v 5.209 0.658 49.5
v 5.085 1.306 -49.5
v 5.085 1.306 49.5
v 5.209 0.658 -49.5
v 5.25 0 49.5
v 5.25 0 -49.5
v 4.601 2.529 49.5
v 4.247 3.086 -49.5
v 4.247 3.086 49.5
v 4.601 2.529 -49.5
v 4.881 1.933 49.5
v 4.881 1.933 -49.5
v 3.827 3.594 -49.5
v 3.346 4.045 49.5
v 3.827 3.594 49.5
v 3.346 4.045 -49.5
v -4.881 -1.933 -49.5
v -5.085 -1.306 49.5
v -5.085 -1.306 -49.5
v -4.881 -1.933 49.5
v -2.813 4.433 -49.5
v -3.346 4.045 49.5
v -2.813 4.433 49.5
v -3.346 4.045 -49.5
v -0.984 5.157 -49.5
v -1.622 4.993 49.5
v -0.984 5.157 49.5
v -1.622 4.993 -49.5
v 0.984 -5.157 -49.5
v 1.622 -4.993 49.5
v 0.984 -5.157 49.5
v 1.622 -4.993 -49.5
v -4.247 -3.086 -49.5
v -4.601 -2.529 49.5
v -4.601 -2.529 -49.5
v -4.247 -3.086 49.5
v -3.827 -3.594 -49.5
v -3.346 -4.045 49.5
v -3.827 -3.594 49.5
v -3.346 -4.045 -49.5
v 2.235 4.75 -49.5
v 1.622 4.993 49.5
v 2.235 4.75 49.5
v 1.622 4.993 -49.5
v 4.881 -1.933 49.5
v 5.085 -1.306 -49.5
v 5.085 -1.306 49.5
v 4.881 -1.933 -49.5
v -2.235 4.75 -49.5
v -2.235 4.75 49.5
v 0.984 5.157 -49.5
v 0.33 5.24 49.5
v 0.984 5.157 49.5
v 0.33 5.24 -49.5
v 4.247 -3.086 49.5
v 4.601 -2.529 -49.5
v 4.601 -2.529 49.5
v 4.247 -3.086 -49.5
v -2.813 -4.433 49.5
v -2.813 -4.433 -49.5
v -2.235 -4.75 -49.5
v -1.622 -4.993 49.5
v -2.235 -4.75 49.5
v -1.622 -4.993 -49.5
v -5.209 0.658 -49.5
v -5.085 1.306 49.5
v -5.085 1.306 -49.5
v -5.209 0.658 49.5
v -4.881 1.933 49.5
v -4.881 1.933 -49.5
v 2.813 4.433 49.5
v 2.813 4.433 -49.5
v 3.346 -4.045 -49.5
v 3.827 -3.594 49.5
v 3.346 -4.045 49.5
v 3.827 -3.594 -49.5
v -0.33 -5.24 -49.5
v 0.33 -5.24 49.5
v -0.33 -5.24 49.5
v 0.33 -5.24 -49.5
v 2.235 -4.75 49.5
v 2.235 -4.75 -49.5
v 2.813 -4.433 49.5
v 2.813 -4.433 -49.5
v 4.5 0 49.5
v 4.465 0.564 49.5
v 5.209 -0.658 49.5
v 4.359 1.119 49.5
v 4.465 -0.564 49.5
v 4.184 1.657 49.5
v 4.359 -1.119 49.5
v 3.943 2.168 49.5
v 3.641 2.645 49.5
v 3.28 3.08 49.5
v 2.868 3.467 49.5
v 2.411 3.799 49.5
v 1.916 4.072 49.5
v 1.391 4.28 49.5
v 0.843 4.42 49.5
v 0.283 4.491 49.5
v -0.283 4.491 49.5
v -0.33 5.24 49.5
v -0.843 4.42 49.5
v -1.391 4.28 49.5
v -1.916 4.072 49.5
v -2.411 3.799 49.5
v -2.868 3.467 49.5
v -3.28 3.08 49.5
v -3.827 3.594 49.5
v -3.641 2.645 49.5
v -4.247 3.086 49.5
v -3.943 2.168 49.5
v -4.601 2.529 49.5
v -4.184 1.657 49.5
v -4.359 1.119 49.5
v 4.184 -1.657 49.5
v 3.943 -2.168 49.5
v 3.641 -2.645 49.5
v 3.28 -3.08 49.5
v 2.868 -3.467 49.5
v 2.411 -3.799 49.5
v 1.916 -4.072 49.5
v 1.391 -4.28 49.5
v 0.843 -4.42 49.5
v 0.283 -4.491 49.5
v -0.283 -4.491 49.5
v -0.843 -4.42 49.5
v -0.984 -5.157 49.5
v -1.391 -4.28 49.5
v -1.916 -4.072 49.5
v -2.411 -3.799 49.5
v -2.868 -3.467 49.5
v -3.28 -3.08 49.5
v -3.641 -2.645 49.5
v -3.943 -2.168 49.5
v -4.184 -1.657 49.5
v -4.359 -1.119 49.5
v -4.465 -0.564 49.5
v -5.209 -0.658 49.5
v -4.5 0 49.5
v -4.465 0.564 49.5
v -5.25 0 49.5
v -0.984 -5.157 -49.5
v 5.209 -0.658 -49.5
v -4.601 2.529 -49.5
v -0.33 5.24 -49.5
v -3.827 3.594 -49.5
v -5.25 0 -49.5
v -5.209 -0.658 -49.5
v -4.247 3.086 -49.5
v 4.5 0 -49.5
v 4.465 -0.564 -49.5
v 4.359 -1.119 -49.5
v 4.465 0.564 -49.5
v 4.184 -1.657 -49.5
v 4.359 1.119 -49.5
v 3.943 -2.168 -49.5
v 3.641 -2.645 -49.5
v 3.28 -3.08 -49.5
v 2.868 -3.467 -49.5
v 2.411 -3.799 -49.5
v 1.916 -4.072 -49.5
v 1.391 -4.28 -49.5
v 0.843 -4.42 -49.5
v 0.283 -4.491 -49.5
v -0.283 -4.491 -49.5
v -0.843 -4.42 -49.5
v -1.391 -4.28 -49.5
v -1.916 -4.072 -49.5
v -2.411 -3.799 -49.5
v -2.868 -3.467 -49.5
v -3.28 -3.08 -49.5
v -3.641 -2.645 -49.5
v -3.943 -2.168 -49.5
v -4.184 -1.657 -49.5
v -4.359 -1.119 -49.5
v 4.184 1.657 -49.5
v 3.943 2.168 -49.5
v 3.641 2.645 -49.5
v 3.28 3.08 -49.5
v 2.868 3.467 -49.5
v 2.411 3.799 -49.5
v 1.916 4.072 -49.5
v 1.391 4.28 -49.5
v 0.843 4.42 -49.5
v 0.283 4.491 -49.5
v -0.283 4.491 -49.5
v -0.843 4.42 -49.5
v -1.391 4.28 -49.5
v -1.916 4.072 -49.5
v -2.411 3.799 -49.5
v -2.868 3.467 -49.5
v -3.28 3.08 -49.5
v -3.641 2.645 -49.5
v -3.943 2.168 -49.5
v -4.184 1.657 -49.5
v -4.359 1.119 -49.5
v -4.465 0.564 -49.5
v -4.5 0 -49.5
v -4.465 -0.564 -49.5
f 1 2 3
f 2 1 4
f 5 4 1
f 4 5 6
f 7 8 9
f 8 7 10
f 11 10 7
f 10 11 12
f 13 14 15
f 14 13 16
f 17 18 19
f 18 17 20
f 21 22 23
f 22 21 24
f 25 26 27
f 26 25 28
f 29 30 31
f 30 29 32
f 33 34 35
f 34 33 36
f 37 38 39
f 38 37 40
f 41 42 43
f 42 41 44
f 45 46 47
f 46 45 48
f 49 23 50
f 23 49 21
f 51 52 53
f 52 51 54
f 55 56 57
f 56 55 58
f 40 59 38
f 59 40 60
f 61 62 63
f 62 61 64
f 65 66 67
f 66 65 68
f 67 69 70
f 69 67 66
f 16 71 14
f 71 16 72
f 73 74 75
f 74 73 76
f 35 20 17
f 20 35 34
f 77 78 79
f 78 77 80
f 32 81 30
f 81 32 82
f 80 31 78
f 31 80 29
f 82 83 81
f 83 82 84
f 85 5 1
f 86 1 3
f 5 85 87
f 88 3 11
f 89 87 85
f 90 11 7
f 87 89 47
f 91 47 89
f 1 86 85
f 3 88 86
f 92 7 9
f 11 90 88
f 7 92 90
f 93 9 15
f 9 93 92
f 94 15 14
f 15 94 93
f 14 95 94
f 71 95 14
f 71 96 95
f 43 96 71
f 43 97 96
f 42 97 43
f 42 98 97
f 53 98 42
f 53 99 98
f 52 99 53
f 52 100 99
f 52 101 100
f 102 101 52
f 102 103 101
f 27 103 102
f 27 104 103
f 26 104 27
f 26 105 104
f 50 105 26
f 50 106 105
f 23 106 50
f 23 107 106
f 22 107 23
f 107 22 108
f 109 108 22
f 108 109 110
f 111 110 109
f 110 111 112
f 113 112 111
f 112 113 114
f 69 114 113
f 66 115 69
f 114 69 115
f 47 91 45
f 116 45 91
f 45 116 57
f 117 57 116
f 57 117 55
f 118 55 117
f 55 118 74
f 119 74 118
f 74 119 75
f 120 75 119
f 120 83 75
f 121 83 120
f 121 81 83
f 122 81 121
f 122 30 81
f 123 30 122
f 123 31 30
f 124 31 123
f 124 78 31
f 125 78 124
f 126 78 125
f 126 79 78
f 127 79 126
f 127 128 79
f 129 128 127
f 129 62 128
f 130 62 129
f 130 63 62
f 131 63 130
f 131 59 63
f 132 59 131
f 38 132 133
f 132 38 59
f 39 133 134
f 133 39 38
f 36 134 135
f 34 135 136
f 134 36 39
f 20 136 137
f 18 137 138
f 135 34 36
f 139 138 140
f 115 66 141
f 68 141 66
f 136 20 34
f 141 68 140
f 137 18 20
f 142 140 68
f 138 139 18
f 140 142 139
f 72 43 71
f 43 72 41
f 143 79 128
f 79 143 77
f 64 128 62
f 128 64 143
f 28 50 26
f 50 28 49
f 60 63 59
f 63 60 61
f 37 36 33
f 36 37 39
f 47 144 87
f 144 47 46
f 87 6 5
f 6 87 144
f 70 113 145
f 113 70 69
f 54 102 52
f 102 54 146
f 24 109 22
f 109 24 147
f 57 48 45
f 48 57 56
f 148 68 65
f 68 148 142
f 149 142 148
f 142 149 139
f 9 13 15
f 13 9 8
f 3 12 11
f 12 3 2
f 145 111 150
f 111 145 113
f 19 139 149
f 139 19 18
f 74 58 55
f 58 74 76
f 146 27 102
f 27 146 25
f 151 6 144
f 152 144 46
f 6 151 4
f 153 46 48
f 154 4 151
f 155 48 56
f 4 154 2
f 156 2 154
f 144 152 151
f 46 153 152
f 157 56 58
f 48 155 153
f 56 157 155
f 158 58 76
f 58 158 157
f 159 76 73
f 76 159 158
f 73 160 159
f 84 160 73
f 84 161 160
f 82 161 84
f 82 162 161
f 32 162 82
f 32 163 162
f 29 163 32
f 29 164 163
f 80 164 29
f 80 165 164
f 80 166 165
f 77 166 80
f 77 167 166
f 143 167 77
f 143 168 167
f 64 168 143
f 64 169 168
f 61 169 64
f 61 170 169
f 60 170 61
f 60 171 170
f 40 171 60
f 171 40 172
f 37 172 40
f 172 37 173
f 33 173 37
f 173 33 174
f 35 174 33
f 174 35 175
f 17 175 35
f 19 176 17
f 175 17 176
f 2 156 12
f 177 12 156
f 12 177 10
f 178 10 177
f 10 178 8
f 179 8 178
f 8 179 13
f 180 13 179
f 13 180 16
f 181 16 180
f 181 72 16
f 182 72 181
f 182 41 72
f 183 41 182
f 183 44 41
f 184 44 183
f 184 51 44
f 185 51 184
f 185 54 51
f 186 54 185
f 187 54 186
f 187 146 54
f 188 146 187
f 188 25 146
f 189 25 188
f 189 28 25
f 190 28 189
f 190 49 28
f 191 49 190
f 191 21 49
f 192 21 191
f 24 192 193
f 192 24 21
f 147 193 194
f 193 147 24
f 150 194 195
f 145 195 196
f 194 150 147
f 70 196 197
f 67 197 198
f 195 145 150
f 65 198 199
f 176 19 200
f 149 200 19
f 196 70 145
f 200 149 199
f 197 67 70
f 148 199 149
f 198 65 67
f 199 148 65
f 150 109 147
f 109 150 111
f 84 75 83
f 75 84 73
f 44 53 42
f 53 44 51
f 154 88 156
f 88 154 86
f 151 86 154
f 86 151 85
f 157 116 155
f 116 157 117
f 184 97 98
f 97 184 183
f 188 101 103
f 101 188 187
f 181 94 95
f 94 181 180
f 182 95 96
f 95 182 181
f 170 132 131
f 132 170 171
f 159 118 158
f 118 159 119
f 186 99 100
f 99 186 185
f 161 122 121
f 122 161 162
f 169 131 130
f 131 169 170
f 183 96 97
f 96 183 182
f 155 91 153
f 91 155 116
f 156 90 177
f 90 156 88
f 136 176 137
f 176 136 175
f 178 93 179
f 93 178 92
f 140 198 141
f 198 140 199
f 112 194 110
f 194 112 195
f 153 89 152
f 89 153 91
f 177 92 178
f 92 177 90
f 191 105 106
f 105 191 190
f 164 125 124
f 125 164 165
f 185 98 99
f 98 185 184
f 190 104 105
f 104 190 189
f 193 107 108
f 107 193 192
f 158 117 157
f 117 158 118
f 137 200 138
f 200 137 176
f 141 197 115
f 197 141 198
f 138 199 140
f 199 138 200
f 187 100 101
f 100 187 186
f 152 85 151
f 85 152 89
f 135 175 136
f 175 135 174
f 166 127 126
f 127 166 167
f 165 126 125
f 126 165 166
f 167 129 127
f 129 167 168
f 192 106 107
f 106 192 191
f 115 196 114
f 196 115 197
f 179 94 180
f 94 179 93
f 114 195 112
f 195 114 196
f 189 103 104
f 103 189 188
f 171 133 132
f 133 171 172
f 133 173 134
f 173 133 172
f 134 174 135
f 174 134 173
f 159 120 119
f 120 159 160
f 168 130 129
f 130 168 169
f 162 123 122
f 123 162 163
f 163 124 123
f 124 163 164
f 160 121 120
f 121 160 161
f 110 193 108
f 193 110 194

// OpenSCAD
$fn = 50;


difference() {
	union() {
		translate(v = [0, 0, -49.5000000000]) {
			cylinder(h = 99, r = 5.2500000000);
		}
	}
	union() {
		translate(v = [0, 0, -100.0000000000]) {
			cylinder(h = 200, r = 4.5000000000);
		}
	}
}
